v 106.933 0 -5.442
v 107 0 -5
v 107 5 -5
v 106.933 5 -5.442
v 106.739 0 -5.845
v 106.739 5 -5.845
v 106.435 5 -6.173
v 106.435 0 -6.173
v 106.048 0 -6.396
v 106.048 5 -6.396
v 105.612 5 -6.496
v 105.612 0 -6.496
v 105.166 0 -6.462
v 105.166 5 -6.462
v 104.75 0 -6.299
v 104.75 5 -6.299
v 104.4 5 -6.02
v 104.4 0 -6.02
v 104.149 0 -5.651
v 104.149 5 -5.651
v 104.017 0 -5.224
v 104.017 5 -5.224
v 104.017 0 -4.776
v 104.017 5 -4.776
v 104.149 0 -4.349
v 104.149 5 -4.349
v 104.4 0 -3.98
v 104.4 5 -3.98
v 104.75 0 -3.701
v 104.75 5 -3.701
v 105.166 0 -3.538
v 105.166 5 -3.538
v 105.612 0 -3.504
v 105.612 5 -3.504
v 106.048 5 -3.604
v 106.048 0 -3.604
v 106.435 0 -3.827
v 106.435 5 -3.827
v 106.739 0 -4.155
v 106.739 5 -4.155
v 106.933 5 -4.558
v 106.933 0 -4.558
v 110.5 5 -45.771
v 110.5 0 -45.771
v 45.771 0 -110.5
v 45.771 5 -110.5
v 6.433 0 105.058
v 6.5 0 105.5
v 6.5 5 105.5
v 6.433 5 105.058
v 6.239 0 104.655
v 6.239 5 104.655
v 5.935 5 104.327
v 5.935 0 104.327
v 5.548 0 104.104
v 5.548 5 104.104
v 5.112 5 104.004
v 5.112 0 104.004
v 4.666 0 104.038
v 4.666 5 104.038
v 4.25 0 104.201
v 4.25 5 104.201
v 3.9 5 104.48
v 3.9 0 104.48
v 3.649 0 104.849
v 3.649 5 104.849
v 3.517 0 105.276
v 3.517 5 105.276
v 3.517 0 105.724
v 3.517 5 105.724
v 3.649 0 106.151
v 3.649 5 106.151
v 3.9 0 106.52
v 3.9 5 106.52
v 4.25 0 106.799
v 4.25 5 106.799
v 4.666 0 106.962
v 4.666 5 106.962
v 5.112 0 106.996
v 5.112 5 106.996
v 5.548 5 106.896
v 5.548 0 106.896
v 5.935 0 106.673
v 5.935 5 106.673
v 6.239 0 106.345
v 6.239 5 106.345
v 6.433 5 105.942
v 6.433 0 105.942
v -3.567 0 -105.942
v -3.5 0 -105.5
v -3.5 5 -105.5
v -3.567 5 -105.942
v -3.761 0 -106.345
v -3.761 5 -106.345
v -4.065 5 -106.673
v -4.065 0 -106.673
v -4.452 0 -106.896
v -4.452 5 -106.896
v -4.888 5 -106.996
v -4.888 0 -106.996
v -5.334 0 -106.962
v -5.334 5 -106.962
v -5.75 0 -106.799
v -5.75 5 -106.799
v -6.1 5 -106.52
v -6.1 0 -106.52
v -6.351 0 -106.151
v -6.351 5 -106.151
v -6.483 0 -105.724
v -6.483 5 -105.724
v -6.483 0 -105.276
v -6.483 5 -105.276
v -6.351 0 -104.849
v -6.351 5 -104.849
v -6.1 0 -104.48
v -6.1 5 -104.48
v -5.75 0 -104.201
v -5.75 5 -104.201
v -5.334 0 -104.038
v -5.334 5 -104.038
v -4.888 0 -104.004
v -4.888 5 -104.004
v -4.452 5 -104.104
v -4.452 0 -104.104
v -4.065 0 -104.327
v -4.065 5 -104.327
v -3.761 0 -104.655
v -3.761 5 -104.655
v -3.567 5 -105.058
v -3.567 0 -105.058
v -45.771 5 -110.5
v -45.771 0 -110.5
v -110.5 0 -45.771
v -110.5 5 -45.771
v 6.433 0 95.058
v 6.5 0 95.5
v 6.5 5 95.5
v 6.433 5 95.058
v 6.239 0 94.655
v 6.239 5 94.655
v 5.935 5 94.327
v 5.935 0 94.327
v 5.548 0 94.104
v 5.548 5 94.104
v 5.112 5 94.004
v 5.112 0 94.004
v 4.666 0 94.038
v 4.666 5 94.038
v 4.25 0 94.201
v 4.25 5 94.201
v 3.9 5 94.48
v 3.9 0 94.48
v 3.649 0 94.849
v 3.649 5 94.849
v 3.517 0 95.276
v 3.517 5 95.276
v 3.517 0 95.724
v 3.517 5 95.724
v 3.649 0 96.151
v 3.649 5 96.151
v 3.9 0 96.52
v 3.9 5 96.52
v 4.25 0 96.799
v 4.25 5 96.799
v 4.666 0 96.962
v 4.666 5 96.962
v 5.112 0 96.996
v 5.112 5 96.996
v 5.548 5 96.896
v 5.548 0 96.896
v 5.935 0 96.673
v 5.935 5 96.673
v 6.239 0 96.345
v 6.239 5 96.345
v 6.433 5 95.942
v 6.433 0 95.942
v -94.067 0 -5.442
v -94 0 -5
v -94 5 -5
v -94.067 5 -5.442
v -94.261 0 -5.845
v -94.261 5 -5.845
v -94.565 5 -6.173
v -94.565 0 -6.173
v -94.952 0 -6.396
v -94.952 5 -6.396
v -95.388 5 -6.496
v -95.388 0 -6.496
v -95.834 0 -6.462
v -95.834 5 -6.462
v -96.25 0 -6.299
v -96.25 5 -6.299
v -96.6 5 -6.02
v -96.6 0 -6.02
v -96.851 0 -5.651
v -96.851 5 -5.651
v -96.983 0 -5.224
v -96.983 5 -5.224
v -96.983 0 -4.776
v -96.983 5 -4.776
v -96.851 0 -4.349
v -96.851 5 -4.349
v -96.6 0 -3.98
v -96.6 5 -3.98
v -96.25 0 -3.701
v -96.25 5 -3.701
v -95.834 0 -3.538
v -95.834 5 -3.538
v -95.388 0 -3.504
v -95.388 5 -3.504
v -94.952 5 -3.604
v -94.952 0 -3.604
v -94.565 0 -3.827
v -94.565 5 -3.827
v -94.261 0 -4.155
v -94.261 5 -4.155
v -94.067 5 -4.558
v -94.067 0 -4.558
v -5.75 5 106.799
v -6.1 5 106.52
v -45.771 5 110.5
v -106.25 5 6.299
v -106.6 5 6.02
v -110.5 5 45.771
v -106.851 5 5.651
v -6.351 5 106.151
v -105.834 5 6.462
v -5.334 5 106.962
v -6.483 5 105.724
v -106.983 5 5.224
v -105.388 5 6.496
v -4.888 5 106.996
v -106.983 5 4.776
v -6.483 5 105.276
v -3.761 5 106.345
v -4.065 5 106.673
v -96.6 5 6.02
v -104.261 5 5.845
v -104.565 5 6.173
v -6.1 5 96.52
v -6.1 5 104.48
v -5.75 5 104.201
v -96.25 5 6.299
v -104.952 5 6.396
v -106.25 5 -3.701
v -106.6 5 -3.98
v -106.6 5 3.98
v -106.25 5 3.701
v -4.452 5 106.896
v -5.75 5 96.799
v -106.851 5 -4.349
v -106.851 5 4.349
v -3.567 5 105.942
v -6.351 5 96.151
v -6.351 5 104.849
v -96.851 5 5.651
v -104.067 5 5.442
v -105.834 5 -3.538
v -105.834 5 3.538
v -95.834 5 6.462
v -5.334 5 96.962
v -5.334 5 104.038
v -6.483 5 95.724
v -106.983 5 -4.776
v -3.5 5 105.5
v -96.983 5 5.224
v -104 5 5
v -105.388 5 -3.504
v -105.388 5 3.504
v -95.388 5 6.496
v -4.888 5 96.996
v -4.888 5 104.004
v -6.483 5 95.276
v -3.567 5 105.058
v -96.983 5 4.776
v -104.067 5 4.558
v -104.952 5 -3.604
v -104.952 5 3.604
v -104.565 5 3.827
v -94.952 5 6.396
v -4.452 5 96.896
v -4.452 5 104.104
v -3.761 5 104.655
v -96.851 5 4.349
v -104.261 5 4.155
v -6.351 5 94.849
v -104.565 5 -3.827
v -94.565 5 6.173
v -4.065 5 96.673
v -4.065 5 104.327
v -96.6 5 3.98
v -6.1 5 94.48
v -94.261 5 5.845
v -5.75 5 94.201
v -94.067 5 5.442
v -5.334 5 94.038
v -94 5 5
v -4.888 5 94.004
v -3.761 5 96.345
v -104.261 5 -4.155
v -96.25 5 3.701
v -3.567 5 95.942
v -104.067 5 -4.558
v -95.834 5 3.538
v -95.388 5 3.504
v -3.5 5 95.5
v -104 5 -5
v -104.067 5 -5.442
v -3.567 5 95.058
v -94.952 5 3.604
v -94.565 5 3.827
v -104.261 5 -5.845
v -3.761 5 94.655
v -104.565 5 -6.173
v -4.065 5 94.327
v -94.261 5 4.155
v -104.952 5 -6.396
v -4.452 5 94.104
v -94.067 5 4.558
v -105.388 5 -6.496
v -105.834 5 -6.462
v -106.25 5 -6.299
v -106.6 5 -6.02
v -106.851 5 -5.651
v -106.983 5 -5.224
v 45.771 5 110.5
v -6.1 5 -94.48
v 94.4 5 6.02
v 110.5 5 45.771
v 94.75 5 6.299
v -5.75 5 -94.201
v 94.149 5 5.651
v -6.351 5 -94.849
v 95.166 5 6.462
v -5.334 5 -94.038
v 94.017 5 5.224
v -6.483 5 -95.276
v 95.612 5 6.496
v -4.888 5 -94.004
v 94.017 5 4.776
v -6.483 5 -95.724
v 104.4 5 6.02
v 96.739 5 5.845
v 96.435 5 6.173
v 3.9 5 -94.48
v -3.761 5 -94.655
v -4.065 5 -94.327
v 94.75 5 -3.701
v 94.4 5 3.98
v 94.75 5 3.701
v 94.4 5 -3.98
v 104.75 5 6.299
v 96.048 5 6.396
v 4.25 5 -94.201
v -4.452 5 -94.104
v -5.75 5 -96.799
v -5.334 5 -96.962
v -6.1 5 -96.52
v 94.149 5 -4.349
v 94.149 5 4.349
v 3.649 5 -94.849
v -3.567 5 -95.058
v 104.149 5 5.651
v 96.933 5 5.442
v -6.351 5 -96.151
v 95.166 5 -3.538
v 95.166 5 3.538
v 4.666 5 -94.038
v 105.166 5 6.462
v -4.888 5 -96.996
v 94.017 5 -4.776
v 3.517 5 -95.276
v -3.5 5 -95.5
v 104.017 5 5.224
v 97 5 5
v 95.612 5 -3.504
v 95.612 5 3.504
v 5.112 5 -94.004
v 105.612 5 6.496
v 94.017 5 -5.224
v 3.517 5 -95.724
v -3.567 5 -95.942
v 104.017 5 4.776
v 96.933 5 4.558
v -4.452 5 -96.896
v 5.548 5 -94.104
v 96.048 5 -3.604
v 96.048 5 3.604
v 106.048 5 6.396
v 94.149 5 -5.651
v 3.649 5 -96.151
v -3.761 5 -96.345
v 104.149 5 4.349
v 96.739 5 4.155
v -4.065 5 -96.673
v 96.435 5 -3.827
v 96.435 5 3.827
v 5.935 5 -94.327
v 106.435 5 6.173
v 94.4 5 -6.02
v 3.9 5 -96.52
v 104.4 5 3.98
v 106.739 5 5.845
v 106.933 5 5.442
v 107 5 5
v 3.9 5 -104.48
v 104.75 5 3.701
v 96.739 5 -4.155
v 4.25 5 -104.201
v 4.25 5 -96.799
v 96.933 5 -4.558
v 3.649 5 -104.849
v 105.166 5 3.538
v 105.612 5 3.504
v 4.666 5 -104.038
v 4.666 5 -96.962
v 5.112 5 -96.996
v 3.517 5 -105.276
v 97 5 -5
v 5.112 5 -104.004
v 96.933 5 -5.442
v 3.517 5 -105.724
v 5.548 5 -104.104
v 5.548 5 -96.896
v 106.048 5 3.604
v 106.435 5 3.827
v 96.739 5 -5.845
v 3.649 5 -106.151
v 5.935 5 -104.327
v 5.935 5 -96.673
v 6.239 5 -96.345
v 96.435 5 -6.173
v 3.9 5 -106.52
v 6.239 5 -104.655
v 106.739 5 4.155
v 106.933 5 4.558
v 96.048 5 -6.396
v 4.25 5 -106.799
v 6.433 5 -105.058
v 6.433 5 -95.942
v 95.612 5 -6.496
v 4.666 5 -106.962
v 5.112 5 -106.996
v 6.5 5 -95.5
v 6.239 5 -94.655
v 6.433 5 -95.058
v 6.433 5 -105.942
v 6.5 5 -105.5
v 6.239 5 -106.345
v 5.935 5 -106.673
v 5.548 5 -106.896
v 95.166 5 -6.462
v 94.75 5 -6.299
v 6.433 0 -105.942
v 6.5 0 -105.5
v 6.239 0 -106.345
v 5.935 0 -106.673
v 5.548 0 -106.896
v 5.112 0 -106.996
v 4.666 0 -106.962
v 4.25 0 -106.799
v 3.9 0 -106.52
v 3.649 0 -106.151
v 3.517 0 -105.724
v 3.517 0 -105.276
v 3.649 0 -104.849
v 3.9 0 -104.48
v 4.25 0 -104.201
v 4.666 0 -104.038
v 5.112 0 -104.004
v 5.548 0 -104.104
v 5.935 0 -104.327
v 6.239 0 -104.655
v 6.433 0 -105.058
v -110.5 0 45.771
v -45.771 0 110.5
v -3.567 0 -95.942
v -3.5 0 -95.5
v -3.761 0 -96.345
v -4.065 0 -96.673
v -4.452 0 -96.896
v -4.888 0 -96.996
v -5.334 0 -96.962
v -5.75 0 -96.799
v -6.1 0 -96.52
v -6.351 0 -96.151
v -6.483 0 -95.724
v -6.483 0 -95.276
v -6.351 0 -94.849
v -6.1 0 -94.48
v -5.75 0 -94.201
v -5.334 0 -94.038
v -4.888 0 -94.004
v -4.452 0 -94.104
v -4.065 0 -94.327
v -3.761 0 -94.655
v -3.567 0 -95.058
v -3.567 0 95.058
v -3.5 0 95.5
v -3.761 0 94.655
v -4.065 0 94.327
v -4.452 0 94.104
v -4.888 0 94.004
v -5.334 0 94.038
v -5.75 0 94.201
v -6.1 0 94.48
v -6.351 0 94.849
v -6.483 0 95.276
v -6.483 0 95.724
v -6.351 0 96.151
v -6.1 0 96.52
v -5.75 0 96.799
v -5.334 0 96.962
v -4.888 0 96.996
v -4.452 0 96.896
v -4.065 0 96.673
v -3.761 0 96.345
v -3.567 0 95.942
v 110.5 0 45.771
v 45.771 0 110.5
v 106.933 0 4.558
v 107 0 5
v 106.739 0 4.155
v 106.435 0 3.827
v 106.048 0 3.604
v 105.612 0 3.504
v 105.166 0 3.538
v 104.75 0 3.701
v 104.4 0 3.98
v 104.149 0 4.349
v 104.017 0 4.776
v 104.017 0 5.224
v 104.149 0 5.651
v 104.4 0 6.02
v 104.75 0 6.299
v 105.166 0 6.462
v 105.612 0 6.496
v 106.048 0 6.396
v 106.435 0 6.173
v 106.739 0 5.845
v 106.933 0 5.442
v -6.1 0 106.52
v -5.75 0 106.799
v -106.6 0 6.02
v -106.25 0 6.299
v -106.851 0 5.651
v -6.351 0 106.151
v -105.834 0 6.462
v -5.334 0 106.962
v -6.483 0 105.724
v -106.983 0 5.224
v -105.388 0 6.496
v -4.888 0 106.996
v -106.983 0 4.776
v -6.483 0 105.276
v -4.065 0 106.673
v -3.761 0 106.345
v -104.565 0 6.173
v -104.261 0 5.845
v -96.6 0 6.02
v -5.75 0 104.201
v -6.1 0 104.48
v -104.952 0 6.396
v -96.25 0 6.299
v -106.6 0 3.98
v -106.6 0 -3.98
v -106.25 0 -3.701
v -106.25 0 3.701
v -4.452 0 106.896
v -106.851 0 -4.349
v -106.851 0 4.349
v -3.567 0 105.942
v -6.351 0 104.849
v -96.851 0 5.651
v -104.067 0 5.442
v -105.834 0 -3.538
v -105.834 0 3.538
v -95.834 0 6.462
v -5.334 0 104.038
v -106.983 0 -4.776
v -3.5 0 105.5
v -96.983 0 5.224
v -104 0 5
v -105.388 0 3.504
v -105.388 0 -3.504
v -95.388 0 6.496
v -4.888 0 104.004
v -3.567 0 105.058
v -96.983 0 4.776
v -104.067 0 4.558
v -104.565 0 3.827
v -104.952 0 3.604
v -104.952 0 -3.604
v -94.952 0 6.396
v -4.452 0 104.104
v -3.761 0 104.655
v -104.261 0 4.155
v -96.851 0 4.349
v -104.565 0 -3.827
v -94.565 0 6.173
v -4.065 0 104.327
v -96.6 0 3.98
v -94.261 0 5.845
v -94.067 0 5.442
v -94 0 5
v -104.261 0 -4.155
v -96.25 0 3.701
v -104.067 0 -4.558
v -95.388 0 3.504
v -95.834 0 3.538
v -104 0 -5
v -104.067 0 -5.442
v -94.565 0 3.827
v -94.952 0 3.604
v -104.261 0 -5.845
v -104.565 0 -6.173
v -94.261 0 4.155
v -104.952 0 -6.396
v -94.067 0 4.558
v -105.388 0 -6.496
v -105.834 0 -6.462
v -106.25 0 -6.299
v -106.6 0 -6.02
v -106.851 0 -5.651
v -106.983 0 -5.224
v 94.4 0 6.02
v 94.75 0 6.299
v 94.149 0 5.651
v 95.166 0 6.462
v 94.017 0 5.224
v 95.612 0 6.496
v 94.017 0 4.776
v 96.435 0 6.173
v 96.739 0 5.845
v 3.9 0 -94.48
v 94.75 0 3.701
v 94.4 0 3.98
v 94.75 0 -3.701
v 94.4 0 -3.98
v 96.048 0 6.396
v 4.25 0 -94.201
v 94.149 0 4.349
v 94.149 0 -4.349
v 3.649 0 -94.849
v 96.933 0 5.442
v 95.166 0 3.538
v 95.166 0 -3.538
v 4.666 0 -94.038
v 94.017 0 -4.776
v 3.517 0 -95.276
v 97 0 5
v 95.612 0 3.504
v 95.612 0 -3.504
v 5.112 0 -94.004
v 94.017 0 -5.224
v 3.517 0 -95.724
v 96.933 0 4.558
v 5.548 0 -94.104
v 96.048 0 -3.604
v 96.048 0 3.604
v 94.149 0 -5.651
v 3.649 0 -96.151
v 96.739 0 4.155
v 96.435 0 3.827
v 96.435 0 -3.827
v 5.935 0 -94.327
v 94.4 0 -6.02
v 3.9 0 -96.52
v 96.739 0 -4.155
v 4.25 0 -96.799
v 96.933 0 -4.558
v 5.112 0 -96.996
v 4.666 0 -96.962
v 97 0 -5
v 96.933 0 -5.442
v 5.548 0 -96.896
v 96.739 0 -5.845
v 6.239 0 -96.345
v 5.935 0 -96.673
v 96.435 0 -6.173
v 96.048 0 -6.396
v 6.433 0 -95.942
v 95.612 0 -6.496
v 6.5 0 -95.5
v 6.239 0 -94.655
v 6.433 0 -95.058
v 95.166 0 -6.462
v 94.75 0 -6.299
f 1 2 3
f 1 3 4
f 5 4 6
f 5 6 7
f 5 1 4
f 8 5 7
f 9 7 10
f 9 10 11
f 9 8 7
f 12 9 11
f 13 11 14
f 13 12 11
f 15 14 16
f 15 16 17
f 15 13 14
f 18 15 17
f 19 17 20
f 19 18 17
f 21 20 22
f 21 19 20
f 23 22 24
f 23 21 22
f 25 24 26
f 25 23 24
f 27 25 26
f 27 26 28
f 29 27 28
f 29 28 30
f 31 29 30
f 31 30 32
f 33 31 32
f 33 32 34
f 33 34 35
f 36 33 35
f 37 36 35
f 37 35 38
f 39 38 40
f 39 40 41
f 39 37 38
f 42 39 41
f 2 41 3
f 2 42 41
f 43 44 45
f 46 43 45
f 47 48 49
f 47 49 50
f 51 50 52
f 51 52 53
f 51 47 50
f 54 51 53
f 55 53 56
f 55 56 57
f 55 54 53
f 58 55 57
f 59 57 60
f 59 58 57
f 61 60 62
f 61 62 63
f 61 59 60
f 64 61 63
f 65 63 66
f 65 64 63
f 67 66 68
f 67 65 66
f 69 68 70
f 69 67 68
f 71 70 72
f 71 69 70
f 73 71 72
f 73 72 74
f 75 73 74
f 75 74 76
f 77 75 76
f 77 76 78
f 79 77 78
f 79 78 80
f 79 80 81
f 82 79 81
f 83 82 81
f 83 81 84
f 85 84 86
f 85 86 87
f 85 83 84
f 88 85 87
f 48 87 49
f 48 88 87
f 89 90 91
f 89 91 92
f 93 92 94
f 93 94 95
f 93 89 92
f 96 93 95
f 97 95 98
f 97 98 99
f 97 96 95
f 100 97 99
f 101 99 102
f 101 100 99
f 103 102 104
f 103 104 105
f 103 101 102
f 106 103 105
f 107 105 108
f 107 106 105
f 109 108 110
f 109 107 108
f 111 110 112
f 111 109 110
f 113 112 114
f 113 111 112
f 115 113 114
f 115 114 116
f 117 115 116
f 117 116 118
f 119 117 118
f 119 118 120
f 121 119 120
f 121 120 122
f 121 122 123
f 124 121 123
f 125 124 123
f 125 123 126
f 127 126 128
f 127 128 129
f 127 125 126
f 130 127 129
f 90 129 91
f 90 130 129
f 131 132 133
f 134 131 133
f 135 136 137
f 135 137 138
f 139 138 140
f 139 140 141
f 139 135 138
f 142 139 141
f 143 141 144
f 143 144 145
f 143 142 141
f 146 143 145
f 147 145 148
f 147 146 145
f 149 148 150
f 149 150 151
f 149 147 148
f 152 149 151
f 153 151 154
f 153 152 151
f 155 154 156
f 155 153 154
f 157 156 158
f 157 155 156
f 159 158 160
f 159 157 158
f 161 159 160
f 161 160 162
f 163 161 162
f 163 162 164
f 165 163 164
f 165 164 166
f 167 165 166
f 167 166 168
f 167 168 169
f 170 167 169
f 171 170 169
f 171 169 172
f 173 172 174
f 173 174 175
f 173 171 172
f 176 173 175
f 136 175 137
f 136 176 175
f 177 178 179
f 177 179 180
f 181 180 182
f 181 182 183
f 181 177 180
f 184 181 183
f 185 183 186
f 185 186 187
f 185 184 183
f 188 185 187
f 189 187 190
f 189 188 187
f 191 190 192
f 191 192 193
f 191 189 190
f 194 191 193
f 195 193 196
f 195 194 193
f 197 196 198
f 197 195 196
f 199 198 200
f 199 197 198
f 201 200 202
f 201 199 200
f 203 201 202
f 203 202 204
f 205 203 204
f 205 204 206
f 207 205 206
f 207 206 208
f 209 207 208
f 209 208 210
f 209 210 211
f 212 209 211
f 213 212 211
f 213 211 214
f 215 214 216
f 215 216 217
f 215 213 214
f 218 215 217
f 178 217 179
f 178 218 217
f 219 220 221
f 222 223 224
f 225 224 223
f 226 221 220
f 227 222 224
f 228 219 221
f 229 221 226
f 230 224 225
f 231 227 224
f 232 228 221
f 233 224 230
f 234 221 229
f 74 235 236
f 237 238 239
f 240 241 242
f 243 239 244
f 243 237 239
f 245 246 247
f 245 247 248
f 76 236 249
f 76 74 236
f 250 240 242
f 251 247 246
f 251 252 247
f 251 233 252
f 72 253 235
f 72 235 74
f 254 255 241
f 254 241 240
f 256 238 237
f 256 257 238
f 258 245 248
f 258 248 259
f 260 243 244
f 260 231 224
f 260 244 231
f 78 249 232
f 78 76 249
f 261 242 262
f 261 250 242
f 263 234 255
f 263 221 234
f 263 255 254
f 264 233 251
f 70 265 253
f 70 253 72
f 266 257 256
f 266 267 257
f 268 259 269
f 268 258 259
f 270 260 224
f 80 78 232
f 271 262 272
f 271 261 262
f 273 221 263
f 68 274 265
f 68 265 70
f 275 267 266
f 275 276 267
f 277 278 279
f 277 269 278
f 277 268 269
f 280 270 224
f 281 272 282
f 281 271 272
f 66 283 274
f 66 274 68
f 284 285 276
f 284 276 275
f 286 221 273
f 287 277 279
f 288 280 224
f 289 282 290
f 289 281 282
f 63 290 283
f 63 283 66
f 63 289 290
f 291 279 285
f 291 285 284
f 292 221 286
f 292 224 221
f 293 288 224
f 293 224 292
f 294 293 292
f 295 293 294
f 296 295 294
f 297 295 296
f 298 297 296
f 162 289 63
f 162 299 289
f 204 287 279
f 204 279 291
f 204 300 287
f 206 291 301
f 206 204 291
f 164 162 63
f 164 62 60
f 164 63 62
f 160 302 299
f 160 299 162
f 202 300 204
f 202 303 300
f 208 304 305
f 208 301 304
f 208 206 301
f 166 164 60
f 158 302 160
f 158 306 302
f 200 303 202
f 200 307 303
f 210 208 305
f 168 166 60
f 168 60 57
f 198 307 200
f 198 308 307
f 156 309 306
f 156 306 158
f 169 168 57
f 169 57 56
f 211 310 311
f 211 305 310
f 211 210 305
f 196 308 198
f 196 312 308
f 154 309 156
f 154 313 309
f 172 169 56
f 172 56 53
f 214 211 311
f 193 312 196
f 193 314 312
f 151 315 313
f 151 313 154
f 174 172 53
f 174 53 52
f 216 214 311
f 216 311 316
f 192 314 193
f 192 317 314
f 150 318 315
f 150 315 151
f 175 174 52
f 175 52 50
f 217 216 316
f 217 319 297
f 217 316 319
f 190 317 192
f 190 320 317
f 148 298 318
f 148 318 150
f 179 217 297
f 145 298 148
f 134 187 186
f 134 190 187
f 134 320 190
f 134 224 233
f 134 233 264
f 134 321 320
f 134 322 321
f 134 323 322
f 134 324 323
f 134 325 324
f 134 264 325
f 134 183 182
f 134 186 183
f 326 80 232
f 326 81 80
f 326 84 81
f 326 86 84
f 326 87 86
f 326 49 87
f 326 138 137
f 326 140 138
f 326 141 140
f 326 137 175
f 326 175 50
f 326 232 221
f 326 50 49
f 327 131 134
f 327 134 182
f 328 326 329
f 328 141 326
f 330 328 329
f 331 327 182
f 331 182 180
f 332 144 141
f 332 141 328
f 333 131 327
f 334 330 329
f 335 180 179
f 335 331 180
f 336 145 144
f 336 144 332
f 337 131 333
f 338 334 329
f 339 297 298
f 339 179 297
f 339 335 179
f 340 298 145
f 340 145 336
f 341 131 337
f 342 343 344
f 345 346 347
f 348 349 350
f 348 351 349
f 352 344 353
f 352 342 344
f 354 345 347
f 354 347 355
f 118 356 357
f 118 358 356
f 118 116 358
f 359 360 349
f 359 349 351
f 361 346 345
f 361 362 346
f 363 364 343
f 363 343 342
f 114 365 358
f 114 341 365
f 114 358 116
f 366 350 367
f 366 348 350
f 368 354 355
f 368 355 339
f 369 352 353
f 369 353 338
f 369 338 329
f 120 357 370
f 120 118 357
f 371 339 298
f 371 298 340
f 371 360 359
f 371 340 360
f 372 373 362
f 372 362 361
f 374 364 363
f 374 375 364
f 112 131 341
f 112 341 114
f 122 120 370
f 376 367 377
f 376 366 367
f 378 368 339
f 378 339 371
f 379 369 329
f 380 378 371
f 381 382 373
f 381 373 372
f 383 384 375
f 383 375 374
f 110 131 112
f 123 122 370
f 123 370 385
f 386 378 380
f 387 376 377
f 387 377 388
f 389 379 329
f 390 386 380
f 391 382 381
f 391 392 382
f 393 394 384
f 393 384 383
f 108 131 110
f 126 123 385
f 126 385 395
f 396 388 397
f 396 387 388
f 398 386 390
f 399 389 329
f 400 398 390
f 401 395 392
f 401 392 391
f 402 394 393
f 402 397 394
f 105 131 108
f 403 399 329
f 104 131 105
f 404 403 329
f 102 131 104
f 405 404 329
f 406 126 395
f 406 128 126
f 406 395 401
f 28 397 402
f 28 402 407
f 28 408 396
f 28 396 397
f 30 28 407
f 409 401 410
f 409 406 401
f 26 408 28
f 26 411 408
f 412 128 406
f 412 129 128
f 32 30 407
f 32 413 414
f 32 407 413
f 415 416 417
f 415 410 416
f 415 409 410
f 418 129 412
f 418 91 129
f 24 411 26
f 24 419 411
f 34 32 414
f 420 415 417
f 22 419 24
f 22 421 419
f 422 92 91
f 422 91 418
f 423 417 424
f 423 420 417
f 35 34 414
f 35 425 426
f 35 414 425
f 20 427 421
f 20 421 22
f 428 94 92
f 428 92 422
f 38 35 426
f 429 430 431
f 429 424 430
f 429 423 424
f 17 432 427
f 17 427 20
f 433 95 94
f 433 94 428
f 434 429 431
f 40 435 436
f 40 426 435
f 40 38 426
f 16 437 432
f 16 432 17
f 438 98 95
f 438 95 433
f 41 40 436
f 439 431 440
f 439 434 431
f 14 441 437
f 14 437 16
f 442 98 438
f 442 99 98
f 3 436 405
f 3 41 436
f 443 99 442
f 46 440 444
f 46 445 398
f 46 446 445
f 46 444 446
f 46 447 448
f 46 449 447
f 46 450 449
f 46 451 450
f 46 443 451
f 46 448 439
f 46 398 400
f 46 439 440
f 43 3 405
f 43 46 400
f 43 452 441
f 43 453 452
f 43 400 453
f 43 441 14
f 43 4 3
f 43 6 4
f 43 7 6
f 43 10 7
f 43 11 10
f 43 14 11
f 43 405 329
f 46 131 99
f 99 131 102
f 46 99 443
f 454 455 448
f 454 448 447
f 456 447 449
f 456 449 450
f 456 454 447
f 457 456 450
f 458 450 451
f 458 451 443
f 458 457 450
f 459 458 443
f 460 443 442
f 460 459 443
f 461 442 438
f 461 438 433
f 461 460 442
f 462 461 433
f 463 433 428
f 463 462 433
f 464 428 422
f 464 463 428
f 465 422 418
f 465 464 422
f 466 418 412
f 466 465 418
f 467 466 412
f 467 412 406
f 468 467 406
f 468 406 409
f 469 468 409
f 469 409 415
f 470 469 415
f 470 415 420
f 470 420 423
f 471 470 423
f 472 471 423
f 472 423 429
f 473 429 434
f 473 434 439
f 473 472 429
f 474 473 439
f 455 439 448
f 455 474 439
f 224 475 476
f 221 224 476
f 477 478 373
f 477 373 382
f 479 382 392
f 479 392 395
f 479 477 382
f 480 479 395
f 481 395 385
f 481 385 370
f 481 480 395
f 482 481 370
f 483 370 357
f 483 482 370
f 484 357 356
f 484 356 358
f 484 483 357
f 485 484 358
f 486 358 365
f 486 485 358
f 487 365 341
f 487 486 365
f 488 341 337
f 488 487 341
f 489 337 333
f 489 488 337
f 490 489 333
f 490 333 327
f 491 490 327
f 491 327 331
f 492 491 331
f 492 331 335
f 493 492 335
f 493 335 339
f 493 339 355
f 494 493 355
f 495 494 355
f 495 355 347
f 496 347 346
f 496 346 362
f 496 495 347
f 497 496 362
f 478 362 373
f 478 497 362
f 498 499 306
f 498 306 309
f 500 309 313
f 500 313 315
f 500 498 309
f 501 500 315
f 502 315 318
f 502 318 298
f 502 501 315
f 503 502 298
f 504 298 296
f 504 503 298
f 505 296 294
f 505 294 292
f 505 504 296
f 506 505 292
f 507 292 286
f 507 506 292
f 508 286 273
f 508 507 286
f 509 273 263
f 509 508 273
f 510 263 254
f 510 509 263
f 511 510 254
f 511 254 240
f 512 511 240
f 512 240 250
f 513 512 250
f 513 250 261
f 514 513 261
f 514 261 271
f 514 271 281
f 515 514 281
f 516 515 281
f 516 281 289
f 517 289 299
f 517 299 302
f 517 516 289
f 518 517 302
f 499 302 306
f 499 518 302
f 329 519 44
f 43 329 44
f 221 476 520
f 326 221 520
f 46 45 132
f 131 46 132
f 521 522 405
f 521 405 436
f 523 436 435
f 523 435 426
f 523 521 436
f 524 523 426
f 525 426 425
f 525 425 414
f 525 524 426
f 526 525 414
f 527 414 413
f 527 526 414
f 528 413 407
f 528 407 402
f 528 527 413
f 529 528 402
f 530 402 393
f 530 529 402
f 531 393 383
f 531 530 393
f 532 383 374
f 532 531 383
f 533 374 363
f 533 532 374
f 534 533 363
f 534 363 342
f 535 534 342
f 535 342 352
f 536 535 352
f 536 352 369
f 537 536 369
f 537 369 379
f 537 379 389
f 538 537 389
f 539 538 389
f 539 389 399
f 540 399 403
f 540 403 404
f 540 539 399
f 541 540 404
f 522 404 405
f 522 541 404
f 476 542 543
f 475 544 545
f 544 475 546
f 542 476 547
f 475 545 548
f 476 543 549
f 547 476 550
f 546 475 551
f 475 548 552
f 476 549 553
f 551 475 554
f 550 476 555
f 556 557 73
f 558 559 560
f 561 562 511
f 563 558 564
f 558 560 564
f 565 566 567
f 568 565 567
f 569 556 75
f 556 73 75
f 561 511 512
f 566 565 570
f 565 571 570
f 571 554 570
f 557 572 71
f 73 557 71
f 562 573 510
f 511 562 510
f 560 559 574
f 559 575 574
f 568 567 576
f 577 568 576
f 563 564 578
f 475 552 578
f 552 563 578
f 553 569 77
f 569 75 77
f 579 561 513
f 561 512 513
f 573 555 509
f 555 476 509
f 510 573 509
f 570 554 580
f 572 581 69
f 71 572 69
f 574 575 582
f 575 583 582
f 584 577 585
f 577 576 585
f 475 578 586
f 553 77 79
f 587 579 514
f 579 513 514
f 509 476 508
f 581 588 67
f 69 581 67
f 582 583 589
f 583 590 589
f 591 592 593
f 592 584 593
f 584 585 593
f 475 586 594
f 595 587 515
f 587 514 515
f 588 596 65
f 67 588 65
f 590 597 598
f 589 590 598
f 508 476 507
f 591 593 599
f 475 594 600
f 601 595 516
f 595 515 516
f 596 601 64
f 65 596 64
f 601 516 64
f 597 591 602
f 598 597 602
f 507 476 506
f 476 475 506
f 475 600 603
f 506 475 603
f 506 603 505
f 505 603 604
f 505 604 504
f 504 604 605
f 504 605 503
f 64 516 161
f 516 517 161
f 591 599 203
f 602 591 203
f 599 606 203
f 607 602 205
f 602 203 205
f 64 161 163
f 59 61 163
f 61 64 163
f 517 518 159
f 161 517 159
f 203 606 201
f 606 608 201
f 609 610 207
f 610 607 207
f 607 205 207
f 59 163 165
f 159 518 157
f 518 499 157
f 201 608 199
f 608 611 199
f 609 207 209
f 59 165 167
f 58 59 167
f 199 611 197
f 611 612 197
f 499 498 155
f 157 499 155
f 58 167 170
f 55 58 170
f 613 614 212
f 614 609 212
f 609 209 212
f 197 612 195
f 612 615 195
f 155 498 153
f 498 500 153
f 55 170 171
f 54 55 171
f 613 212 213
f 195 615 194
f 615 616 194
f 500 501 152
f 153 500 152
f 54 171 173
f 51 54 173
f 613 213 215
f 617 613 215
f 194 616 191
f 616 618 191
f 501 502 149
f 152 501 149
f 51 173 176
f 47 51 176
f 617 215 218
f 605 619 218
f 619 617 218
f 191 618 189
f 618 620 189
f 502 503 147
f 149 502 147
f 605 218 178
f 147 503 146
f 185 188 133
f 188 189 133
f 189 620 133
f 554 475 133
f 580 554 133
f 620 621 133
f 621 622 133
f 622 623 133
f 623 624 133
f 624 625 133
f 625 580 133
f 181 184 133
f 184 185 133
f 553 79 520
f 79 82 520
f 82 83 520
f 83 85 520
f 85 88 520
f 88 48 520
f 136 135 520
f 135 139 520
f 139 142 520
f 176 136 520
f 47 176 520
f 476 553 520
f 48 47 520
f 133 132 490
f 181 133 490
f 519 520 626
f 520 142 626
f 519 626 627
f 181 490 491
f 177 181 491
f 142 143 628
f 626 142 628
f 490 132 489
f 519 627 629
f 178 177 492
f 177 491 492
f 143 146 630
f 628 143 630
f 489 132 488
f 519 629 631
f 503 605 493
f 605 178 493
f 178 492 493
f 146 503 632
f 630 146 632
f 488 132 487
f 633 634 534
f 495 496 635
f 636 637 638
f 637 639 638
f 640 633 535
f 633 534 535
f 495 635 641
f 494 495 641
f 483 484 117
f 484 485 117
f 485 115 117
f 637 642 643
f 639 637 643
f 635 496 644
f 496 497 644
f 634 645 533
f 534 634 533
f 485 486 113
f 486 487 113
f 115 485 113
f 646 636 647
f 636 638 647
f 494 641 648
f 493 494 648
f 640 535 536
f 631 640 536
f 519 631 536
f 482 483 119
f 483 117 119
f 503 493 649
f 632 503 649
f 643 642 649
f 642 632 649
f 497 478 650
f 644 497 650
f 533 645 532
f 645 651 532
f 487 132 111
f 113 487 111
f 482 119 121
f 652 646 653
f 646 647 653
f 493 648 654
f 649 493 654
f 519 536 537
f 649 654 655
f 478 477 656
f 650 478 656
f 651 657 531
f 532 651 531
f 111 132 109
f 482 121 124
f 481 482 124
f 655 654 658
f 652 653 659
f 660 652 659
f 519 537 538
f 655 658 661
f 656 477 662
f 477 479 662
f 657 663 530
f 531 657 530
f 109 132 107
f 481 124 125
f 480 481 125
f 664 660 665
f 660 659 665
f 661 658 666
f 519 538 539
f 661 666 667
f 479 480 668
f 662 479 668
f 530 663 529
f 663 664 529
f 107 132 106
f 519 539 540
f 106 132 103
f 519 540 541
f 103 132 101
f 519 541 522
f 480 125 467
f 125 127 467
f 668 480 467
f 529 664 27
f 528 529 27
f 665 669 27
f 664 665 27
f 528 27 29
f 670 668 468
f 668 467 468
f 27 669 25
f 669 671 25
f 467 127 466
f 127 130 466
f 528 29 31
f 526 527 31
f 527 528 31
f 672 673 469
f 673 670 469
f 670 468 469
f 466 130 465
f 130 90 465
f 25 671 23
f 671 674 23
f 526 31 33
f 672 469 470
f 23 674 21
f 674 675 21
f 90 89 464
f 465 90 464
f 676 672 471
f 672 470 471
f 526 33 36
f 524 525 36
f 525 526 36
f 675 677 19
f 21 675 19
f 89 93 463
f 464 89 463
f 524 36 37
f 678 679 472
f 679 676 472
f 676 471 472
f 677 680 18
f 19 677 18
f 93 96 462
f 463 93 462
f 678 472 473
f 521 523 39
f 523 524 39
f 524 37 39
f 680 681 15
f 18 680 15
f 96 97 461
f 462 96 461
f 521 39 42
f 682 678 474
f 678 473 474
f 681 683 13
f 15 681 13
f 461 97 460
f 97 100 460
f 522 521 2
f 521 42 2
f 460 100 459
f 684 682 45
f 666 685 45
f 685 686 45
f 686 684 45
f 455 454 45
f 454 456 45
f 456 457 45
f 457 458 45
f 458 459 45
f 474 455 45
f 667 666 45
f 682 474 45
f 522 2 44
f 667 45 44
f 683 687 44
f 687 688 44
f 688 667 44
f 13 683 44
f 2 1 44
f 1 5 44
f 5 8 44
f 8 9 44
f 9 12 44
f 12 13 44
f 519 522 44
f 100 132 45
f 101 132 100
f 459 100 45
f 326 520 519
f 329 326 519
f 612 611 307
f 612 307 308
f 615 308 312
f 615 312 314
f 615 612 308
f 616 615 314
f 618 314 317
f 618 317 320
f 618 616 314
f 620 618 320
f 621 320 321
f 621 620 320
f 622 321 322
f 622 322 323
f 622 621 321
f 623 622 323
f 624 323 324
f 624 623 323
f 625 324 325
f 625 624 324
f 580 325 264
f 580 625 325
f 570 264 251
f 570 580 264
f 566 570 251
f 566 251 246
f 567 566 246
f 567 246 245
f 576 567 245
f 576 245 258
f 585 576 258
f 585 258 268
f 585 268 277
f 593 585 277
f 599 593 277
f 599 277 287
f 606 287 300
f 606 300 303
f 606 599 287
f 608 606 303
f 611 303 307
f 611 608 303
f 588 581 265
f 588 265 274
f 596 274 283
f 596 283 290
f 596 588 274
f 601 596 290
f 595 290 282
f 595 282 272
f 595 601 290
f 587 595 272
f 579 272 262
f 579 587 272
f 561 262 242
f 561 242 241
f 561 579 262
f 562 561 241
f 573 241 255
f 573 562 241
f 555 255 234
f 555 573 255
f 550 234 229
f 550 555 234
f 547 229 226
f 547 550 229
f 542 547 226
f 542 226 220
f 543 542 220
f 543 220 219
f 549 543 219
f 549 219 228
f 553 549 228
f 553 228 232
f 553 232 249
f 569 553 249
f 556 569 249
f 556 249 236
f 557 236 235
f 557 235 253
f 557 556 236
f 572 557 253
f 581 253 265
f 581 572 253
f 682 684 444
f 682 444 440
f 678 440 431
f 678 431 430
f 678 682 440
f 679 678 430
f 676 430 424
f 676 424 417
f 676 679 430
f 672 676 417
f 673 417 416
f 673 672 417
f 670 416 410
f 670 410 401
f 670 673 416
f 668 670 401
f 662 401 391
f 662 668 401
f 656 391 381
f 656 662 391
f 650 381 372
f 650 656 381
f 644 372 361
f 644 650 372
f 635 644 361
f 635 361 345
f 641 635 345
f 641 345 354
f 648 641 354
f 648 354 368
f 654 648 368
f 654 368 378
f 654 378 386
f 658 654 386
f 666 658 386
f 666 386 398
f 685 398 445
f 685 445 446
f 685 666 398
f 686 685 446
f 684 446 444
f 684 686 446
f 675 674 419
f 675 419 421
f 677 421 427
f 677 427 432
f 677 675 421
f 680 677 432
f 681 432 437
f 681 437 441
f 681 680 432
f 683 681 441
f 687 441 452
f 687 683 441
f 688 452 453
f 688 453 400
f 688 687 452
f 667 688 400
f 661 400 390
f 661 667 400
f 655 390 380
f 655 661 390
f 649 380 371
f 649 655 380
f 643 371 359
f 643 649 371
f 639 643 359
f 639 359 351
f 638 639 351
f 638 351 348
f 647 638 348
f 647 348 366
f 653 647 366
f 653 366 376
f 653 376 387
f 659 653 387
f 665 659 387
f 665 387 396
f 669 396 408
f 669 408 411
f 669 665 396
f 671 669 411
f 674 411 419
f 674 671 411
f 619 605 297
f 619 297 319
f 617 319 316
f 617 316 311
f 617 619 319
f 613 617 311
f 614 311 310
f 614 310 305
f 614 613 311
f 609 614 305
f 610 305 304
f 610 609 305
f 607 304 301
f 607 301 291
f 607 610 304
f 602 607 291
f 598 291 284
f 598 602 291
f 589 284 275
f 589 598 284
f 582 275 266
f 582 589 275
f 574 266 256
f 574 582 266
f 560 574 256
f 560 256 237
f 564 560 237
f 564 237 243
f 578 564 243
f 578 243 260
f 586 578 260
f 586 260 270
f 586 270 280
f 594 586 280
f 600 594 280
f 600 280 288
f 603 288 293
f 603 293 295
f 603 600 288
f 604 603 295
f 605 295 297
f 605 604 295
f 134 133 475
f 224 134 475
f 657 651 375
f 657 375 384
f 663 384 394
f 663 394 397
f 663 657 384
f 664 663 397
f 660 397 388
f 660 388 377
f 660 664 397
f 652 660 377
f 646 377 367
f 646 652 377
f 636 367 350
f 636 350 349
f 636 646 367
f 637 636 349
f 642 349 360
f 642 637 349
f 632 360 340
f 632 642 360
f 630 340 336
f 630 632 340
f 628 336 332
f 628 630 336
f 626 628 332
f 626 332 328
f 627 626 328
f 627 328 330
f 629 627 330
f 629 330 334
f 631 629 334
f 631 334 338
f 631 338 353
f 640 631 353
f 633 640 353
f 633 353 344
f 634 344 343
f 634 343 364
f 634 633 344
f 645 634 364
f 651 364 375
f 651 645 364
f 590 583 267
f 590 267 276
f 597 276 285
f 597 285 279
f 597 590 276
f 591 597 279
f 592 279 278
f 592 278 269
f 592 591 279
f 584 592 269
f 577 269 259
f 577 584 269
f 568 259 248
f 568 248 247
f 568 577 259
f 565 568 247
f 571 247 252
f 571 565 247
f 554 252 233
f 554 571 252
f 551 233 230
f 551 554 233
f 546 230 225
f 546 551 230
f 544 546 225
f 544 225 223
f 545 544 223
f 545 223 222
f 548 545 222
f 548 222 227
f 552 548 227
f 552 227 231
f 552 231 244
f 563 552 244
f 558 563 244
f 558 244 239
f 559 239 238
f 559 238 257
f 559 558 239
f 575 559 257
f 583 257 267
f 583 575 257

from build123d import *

# Parameters (mm, degrees)
SKETCH_1_R      = 1.5
EXTRUDE_1_DEPTH = 5


with BuildPart() as part:
    # 스케치1 → 보스-돌출1 (new body)
    with BuildSketch(Plane(origin=(0, 0, 0), x_dir=(1, 0, 0), z_dir=(0, 1, 0))):
        Polygon((45.770598642, -110.5), (110.5, -45.770598642), (110.5, 45.770598642), (45.770598642, 110.5), (-45.770598642, 110.5), (-110.5, 45.770598642), (-110.5, -45.770598642), (-45.770598642, -110.5), align=None)
        with Locations((-5, 105.5)):
            Circle(SKETCH_1_R, mode=Mode.SUBTRACT)
        with Locations((-5, 95.5)):
            Circle(SKETCH_1_R, mode=Mode.SUBTRACT)
        with Locations((5, 95.5)):
            Circle(SKETCH_1_R, mode=Mode.SUBTRACT)
        with Locations((5, 105.5)):
            Circle(SKETCH_1_R, mode=Mode.SUBTRACT)
        with Locations((105.5, 5)):
            Circle(SKETCH_1_R, mode=Mode.SUBTRACT)
        with Locations((95.5, 5)):
            Circle(SKETCH_1_R, mode=Mode.SUBTRACT)
        with Locations((95.5, -5)):
            Circle(SKETCH_1_R, mode=Mode.SUBTRACT)
        with Locations((105.5, -5)):
            Circle(SKETCH_1_R, mode=Mode.SUBTRACT)
        with Locations((5, -105.5)):
            Circle(SKETCH_1_R, mode=Mode.SUBTRACT)
        with Locations((5, -95.5)):
            Circle(SKETCH_1_R, mode=Mode.SUBTRACT)
        with Locations((-5, -95.5)):
            Circle(SKETCH_1_R, mode=Mode.SUBTRACT)
        with Locations((-5, -105.5)):
            Circle(SKETCH_1_R, mode=Mode.SUBTRACT)
        with Locations((-105.5, -5)):
            Circle(SKETCH_1_R, mode=Mode.SUBTRACT)
        with Locations((-95.5, -5)):
            Circle(SKETCH_1_R, mode=Mode.SUBTRACT)
        with Locations((-95.5, 5)):
            Circle(SKETCH_1_R, mode=Mode.SUBTRACT)
        with Locations((-105.5, 5)):
            Circle(SKETCH_1_R, mode=Mode.SUBTRACT)
    extrude(amount=EXTRUDE_1_DEPTH)


solid = part.part
